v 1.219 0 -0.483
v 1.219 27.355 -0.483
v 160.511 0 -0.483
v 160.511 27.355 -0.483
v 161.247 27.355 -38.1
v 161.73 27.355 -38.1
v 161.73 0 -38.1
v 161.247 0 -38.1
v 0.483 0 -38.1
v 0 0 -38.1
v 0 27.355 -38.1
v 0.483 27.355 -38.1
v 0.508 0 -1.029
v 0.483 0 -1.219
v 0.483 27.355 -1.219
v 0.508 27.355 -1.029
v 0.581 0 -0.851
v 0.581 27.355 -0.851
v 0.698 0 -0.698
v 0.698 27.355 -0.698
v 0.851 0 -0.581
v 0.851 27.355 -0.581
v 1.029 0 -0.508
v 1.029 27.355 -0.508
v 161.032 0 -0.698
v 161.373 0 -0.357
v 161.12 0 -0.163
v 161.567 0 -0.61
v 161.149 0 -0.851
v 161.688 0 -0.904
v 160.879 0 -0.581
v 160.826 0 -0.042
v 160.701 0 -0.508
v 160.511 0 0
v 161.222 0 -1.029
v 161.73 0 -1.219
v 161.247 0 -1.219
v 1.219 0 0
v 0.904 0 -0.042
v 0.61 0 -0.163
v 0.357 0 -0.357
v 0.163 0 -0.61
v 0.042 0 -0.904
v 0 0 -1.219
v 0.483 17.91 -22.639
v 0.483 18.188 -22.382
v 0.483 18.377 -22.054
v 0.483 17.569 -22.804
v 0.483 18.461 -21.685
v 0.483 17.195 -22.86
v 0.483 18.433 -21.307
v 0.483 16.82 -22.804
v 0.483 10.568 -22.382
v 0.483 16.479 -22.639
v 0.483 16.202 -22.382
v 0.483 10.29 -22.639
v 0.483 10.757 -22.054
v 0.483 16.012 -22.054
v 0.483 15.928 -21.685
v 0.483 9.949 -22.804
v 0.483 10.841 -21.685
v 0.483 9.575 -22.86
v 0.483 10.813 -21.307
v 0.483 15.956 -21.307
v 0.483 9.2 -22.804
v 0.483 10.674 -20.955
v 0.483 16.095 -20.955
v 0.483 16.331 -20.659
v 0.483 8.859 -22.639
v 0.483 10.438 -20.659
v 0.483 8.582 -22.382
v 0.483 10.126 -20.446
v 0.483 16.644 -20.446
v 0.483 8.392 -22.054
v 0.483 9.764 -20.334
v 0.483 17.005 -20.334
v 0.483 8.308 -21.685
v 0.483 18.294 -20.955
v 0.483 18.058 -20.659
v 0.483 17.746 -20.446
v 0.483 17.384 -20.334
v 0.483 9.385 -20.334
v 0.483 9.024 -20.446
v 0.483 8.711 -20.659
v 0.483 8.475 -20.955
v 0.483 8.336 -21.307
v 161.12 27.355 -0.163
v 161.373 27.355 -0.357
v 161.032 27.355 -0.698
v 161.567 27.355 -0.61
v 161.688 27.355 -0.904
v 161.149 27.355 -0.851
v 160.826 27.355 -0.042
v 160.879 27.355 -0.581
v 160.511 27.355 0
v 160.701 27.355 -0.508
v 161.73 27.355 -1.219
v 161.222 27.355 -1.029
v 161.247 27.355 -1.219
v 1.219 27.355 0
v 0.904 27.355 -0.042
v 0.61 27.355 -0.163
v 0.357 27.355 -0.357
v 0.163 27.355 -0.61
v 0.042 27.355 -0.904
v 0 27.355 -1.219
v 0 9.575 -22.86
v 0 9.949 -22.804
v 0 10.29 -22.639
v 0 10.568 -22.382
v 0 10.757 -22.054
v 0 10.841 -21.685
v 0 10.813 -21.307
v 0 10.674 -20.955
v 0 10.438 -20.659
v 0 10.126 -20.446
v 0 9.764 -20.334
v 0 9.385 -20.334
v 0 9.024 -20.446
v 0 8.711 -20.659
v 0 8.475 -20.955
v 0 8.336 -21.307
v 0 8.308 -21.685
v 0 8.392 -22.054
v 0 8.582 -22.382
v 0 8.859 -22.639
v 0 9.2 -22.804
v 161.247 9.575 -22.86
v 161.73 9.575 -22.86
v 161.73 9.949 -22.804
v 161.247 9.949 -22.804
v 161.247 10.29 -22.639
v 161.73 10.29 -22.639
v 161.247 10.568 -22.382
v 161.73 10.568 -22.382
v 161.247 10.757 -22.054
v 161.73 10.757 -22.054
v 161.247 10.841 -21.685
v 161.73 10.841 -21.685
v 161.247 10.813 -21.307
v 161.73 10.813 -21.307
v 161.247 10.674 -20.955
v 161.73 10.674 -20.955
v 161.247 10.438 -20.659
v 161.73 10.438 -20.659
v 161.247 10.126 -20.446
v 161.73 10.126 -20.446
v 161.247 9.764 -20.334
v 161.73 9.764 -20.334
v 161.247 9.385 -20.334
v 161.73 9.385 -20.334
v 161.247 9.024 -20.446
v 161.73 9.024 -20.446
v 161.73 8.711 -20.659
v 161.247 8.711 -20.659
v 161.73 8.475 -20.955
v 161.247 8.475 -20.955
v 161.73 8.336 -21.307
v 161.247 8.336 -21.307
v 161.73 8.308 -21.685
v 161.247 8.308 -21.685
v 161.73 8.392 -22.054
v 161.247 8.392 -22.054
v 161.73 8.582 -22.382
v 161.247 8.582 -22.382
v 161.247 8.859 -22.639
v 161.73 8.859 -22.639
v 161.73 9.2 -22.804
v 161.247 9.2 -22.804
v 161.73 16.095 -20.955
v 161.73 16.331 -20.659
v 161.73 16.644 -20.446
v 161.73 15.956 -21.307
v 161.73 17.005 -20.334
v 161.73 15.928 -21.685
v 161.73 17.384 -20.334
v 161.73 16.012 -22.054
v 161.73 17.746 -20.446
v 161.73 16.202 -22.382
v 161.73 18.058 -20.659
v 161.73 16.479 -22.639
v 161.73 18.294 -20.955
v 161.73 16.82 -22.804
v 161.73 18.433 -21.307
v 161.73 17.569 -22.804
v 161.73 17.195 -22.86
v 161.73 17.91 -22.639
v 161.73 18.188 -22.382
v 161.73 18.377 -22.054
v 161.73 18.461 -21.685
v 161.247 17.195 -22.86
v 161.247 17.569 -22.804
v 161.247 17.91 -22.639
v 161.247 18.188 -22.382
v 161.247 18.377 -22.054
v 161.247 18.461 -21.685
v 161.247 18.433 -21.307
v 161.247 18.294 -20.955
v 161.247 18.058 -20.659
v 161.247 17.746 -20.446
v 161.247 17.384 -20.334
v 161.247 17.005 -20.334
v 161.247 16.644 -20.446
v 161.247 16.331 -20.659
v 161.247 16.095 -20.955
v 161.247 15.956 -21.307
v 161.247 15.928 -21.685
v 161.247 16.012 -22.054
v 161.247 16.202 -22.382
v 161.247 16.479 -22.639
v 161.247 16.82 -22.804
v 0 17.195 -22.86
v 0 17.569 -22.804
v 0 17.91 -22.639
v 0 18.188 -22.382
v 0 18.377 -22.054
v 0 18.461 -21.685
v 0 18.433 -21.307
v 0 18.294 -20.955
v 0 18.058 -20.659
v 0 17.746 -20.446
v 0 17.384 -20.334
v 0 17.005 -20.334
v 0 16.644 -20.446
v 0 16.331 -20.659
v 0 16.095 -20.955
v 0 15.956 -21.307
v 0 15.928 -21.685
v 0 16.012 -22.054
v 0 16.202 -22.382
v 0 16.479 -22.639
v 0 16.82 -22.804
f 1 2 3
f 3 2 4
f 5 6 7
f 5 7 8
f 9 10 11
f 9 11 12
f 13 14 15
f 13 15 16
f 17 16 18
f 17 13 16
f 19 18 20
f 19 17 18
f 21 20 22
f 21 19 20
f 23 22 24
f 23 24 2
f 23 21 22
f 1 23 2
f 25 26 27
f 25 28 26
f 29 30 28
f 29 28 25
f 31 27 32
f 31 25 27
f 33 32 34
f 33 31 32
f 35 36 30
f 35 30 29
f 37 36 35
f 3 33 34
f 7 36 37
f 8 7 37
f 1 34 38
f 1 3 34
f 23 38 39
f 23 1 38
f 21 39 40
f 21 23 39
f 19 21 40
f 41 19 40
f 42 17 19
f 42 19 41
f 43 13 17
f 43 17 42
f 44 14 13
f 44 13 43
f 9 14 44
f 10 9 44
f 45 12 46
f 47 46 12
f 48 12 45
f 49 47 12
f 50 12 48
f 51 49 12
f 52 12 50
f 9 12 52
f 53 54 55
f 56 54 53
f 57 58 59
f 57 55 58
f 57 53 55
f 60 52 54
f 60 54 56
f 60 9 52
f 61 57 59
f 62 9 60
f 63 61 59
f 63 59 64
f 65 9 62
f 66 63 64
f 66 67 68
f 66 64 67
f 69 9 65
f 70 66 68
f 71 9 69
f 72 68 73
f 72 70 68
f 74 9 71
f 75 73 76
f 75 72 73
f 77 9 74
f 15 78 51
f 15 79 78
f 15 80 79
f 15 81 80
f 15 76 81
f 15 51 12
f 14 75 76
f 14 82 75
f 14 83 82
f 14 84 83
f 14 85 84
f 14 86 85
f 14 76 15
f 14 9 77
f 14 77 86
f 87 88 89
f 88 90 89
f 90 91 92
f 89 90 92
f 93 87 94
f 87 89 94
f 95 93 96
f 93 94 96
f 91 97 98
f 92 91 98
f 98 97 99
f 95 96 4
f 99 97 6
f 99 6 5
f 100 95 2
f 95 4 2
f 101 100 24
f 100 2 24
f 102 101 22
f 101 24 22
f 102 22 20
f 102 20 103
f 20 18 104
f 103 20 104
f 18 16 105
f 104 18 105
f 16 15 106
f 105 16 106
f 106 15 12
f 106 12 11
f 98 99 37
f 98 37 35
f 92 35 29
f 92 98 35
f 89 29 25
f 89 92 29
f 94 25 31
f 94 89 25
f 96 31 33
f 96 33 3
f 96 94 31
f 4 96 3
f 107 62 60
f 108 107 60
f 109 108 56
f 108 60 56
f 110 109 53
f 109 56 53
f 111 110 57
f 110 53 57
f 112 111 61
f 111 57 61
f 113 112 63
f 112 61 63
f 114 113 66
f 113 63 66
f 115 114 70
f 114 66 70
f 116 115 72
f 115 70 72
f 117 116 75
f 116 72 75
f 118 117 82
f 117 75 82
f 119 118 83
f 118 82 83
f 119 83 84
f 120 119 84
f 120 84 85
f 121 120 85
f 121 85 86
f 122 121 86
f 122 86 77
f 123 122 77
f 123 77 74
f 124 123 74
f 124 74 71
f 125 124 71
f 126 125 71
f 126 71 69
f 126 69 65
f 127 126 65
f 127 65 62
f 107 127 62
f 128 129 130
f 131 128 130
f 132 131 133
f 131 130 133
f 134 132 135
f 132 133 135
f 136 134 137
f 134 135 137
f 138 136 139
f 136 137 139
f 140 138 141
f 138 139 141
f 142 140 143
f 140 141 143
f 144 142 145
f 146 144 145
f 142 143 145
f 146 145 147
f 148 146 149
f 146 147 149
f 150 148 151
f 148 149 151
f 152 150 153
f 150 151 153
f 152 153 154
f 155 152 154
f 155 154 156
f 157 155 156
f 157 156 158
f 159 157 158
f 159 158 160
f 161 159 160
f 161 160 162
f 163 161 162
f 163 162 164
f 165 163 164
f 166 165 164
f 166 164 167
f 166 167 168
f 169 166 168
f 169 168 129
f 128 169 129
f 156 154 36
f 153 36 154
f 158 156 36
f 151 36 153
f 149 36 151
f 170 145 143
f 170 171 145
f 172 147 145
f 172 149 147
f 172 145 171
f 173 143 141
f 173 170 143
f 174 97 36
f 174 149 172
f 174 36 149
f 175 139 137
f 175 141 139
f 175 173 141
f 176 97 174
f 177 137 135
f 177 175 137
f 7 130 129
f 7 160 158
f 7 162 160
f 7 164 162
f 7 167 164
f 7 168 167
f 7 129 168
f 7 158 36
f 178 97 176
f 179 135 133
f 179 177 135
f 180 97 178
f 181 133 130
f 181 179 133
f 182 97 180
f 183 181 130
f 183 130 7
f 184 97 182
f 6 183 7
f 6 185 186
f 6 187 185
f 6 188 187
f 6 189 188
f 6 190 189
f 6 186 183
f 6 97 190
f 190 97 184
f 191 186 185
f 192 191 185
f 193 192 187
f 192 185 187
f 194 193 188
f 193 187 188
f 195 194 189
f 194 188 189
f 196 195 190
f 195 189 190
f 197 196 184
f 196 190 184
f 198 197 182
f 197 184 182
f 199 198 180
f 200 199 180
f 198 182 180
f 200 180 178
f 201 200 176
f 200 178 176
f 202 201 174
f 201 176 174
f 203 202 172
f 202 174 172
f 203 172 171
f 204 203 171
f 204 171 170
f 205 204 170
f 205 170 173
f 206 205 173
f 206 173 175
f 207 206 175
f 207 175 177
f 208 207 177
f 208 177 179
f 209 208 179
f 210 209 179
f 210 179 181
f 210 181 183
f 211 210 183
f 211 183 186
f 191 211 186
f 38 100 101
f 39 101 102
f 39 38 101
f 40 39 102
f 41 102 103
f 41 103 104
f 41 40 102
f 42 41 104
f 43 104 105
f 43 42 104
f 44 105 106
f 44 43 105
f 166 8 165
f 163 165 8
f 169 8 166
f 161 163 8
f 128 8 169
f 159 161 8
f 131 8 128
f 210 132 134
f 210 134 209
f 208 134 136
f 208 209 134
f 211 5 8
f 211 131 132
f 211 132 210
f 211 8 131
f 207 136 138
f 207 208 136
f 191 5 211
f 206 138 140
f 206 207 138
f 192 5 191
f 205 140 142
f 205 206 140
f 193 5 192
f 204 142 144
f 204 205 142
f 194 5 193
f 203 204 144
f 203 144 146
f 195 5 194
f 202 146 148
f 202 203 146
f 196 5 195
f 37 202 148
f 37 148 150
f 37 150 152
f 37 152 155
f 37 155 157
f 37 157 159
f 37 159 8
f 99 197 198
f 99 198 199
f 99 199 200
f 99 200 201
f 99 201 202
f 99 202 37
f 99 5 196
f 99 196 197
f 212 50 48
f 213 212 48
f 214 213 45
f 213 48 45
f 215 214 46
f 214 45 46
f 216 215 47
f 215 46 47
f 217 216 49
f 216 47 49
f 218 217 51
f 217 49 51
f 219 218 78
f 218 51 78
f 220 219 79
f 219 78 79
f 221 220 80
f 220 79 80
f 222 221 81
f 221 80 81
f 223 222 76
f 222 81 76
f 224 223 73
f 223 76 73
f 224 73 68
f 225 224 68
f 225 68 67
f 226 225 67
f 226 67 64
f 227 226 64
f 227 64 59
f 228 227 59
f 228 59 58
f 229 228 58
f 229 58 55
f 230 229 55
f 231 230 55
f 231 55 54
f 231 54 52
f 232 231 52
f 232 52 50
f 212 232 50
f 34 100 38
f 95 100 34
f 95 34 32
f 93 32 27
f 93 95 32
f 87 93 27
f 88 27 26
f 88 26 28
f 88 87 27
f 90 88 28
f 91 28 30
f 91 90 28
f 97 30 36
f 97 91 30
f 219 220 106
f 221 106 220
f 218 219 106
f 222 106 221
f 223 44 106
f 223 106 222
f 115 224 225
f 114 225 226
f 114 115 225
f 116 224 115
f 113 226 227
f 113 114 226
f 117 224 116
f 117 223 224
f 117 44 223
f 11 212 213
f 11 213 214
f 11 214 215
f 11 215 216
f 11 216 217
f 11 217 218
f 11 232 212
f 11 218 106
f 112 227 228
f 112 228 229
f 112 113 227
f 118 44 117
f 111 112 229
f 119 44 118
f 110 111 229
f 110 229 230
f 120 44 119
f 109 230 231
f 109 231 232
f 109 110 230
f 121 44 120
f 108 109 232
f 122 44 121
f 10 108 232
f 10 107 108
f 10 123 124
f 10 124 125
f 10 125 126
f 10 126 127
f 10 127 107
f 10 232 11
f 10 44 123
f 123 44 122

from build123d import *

# Parameters (mm, degrees)
SKETCH1_W                    = 161.729977966
SKETCH1_H                    = 27.354597718
BASE_FLANGE1_DEPTH           = 0.4826
EDGE_FLANGE1_STRIP_W         = 3.4036
EDGE_FLANGE1_STRIP_H         = 0.4826
EDGE_FLANGE1_STRIP_CUT_DEPTH = 27.354597718
EDGE_FLANGE1_DEPTH           = 27.354597718
EDGE_FLANGE2_STRIP_W         = 3.4036
EDGE_FLANGE2_STRIP_H         = 0.4826
EDGE_FLANGE2_STRIP_CUT_DEPTH = 27.354597718
EDGE_FLANGE2_DEPTH           = 27.354597718
SKETCH12_R                   = 1.27
CUT_EXTRUDE1_DEPTH           = 169.393793797


# Sheet-metal steps are written as plain solids
with BuildPart() as part:
    # Sketch1 → Base-Flange1 (new body)
    with BuildSketch(Plane.XY):
        with Locations((80.864988983, 13.677298859)):
            Rectangle(SKETCH1_W, SKETCH1_H)
    extrude(amount=-BASE_FLANGE1_DEPTH)

    # Edge-Flange1 strip (across the edge) → Edge-Flange1 strip cut (cut)
    with BuildSketch(Plane(origin=(161.729977966, 27.354597718, -0.4826), x_dir=(-1, 0, 0), z_dir=(0, -1, 0))):
        with Locations((-0.4826, -0.2413)):
            Rectangle(EDGE_FLANGE1_STRIP_W, EDGE_FLANGE1_STRIP_H)
    extrude(amount=EDGE_FLANGE1_STRIP_CUT_DEPTH, mode=Mode.SUBTRACT)

    # Edge-Flange1 section (across the edge) → Edge-Flange1 (add)
    with BuildSketch(Plane(origin=(161.729977966, 27.354597718, -0.4826), x_dir=(-1, 0, 0), z_dir=(0, -1, 0))):
        with BuildLine():
            Line((0, 0.7366), (0, 37.6174))
            Line((0, 37.6174), (0.4826, 37.6174))
            Line((0.4826, 37.6174), (0.4826, 0.7366))
            ThreePointArc((0.4826, 0.7366), (0.698345145, 0.215745145), (1.2192, 0))
            Line((1.2192, 0), (1.2192, -0.4826))
            ThreePointArc((1.2192, -0.4826), (0.357095412, -0.125504588), (0, 0.7366))
        make_face()
    extrude(amount=EDGE_FLANGE1_DEPTH)

    # Edge-Flange2 strip (across the edge) → Edge-Flange2 strip cut (cut)
    with BuildSketch(Plane(origin=(0, 0, -0.4826), x_dir=(1, 0, 0), z_dir=(0, 1, 0))):
        with Locations((-0.4826, -0.2413)):
            Rectangle(EDGE_FLANGE2_STRIP_W, EDGE_FLANGE2_STRIP_H)
    extrude(amount=EDGE_FLANGE2_STRIP_CUT_DEPTH, mode=Mode.SUBTRACT)

    # Edge-Flange2 section (across the edge) → Edge-Flange2 (add)
    with BuildSketch(Plane(origin=(0, 0, -0.4826), x_dir=(1, 0, 0), z_dir=(0, 1, 0))):
        with BuildLine():
            Line((0, 0.7366), (0, 37.6174))
            Line((0, 37.6174), (0.4826, 37.6174))
            Line((0.4826, 37.6174), (0.4826, 0.7366))
            ThreePointArc((0.4826, 0.7366), (0.698345145, 0.215745145), (1.2192, 0))
            Line((1.2192, 0), (1.2192, -0.4826))
            ThreePointArc((1.2192, -0.4826), (0.357095412, -0.125504588), (0, 0.7366))
        make_face()
    extrude(amount=EDGE_FLANGE2_DEPTH)

    # Sketch12 → Cut-Extrude1 (cut, through all)
    with BuildSketch(Plane(origin=(161.729977966, 0, 0), x_dir=(0, 0, -1), z_dir=(1, 0, 0))):
        with Locations((21.59, 17.194597718)):
            Circle(SKETCH12_R)
        with Locations((21.59, 9.574597718)):
            Circle(SKETCH12_R)
    extrude(amount=-CUT_EXTRUDE1_DEPTH, mode=Mode.SUBTRACT)


solid = part.part
